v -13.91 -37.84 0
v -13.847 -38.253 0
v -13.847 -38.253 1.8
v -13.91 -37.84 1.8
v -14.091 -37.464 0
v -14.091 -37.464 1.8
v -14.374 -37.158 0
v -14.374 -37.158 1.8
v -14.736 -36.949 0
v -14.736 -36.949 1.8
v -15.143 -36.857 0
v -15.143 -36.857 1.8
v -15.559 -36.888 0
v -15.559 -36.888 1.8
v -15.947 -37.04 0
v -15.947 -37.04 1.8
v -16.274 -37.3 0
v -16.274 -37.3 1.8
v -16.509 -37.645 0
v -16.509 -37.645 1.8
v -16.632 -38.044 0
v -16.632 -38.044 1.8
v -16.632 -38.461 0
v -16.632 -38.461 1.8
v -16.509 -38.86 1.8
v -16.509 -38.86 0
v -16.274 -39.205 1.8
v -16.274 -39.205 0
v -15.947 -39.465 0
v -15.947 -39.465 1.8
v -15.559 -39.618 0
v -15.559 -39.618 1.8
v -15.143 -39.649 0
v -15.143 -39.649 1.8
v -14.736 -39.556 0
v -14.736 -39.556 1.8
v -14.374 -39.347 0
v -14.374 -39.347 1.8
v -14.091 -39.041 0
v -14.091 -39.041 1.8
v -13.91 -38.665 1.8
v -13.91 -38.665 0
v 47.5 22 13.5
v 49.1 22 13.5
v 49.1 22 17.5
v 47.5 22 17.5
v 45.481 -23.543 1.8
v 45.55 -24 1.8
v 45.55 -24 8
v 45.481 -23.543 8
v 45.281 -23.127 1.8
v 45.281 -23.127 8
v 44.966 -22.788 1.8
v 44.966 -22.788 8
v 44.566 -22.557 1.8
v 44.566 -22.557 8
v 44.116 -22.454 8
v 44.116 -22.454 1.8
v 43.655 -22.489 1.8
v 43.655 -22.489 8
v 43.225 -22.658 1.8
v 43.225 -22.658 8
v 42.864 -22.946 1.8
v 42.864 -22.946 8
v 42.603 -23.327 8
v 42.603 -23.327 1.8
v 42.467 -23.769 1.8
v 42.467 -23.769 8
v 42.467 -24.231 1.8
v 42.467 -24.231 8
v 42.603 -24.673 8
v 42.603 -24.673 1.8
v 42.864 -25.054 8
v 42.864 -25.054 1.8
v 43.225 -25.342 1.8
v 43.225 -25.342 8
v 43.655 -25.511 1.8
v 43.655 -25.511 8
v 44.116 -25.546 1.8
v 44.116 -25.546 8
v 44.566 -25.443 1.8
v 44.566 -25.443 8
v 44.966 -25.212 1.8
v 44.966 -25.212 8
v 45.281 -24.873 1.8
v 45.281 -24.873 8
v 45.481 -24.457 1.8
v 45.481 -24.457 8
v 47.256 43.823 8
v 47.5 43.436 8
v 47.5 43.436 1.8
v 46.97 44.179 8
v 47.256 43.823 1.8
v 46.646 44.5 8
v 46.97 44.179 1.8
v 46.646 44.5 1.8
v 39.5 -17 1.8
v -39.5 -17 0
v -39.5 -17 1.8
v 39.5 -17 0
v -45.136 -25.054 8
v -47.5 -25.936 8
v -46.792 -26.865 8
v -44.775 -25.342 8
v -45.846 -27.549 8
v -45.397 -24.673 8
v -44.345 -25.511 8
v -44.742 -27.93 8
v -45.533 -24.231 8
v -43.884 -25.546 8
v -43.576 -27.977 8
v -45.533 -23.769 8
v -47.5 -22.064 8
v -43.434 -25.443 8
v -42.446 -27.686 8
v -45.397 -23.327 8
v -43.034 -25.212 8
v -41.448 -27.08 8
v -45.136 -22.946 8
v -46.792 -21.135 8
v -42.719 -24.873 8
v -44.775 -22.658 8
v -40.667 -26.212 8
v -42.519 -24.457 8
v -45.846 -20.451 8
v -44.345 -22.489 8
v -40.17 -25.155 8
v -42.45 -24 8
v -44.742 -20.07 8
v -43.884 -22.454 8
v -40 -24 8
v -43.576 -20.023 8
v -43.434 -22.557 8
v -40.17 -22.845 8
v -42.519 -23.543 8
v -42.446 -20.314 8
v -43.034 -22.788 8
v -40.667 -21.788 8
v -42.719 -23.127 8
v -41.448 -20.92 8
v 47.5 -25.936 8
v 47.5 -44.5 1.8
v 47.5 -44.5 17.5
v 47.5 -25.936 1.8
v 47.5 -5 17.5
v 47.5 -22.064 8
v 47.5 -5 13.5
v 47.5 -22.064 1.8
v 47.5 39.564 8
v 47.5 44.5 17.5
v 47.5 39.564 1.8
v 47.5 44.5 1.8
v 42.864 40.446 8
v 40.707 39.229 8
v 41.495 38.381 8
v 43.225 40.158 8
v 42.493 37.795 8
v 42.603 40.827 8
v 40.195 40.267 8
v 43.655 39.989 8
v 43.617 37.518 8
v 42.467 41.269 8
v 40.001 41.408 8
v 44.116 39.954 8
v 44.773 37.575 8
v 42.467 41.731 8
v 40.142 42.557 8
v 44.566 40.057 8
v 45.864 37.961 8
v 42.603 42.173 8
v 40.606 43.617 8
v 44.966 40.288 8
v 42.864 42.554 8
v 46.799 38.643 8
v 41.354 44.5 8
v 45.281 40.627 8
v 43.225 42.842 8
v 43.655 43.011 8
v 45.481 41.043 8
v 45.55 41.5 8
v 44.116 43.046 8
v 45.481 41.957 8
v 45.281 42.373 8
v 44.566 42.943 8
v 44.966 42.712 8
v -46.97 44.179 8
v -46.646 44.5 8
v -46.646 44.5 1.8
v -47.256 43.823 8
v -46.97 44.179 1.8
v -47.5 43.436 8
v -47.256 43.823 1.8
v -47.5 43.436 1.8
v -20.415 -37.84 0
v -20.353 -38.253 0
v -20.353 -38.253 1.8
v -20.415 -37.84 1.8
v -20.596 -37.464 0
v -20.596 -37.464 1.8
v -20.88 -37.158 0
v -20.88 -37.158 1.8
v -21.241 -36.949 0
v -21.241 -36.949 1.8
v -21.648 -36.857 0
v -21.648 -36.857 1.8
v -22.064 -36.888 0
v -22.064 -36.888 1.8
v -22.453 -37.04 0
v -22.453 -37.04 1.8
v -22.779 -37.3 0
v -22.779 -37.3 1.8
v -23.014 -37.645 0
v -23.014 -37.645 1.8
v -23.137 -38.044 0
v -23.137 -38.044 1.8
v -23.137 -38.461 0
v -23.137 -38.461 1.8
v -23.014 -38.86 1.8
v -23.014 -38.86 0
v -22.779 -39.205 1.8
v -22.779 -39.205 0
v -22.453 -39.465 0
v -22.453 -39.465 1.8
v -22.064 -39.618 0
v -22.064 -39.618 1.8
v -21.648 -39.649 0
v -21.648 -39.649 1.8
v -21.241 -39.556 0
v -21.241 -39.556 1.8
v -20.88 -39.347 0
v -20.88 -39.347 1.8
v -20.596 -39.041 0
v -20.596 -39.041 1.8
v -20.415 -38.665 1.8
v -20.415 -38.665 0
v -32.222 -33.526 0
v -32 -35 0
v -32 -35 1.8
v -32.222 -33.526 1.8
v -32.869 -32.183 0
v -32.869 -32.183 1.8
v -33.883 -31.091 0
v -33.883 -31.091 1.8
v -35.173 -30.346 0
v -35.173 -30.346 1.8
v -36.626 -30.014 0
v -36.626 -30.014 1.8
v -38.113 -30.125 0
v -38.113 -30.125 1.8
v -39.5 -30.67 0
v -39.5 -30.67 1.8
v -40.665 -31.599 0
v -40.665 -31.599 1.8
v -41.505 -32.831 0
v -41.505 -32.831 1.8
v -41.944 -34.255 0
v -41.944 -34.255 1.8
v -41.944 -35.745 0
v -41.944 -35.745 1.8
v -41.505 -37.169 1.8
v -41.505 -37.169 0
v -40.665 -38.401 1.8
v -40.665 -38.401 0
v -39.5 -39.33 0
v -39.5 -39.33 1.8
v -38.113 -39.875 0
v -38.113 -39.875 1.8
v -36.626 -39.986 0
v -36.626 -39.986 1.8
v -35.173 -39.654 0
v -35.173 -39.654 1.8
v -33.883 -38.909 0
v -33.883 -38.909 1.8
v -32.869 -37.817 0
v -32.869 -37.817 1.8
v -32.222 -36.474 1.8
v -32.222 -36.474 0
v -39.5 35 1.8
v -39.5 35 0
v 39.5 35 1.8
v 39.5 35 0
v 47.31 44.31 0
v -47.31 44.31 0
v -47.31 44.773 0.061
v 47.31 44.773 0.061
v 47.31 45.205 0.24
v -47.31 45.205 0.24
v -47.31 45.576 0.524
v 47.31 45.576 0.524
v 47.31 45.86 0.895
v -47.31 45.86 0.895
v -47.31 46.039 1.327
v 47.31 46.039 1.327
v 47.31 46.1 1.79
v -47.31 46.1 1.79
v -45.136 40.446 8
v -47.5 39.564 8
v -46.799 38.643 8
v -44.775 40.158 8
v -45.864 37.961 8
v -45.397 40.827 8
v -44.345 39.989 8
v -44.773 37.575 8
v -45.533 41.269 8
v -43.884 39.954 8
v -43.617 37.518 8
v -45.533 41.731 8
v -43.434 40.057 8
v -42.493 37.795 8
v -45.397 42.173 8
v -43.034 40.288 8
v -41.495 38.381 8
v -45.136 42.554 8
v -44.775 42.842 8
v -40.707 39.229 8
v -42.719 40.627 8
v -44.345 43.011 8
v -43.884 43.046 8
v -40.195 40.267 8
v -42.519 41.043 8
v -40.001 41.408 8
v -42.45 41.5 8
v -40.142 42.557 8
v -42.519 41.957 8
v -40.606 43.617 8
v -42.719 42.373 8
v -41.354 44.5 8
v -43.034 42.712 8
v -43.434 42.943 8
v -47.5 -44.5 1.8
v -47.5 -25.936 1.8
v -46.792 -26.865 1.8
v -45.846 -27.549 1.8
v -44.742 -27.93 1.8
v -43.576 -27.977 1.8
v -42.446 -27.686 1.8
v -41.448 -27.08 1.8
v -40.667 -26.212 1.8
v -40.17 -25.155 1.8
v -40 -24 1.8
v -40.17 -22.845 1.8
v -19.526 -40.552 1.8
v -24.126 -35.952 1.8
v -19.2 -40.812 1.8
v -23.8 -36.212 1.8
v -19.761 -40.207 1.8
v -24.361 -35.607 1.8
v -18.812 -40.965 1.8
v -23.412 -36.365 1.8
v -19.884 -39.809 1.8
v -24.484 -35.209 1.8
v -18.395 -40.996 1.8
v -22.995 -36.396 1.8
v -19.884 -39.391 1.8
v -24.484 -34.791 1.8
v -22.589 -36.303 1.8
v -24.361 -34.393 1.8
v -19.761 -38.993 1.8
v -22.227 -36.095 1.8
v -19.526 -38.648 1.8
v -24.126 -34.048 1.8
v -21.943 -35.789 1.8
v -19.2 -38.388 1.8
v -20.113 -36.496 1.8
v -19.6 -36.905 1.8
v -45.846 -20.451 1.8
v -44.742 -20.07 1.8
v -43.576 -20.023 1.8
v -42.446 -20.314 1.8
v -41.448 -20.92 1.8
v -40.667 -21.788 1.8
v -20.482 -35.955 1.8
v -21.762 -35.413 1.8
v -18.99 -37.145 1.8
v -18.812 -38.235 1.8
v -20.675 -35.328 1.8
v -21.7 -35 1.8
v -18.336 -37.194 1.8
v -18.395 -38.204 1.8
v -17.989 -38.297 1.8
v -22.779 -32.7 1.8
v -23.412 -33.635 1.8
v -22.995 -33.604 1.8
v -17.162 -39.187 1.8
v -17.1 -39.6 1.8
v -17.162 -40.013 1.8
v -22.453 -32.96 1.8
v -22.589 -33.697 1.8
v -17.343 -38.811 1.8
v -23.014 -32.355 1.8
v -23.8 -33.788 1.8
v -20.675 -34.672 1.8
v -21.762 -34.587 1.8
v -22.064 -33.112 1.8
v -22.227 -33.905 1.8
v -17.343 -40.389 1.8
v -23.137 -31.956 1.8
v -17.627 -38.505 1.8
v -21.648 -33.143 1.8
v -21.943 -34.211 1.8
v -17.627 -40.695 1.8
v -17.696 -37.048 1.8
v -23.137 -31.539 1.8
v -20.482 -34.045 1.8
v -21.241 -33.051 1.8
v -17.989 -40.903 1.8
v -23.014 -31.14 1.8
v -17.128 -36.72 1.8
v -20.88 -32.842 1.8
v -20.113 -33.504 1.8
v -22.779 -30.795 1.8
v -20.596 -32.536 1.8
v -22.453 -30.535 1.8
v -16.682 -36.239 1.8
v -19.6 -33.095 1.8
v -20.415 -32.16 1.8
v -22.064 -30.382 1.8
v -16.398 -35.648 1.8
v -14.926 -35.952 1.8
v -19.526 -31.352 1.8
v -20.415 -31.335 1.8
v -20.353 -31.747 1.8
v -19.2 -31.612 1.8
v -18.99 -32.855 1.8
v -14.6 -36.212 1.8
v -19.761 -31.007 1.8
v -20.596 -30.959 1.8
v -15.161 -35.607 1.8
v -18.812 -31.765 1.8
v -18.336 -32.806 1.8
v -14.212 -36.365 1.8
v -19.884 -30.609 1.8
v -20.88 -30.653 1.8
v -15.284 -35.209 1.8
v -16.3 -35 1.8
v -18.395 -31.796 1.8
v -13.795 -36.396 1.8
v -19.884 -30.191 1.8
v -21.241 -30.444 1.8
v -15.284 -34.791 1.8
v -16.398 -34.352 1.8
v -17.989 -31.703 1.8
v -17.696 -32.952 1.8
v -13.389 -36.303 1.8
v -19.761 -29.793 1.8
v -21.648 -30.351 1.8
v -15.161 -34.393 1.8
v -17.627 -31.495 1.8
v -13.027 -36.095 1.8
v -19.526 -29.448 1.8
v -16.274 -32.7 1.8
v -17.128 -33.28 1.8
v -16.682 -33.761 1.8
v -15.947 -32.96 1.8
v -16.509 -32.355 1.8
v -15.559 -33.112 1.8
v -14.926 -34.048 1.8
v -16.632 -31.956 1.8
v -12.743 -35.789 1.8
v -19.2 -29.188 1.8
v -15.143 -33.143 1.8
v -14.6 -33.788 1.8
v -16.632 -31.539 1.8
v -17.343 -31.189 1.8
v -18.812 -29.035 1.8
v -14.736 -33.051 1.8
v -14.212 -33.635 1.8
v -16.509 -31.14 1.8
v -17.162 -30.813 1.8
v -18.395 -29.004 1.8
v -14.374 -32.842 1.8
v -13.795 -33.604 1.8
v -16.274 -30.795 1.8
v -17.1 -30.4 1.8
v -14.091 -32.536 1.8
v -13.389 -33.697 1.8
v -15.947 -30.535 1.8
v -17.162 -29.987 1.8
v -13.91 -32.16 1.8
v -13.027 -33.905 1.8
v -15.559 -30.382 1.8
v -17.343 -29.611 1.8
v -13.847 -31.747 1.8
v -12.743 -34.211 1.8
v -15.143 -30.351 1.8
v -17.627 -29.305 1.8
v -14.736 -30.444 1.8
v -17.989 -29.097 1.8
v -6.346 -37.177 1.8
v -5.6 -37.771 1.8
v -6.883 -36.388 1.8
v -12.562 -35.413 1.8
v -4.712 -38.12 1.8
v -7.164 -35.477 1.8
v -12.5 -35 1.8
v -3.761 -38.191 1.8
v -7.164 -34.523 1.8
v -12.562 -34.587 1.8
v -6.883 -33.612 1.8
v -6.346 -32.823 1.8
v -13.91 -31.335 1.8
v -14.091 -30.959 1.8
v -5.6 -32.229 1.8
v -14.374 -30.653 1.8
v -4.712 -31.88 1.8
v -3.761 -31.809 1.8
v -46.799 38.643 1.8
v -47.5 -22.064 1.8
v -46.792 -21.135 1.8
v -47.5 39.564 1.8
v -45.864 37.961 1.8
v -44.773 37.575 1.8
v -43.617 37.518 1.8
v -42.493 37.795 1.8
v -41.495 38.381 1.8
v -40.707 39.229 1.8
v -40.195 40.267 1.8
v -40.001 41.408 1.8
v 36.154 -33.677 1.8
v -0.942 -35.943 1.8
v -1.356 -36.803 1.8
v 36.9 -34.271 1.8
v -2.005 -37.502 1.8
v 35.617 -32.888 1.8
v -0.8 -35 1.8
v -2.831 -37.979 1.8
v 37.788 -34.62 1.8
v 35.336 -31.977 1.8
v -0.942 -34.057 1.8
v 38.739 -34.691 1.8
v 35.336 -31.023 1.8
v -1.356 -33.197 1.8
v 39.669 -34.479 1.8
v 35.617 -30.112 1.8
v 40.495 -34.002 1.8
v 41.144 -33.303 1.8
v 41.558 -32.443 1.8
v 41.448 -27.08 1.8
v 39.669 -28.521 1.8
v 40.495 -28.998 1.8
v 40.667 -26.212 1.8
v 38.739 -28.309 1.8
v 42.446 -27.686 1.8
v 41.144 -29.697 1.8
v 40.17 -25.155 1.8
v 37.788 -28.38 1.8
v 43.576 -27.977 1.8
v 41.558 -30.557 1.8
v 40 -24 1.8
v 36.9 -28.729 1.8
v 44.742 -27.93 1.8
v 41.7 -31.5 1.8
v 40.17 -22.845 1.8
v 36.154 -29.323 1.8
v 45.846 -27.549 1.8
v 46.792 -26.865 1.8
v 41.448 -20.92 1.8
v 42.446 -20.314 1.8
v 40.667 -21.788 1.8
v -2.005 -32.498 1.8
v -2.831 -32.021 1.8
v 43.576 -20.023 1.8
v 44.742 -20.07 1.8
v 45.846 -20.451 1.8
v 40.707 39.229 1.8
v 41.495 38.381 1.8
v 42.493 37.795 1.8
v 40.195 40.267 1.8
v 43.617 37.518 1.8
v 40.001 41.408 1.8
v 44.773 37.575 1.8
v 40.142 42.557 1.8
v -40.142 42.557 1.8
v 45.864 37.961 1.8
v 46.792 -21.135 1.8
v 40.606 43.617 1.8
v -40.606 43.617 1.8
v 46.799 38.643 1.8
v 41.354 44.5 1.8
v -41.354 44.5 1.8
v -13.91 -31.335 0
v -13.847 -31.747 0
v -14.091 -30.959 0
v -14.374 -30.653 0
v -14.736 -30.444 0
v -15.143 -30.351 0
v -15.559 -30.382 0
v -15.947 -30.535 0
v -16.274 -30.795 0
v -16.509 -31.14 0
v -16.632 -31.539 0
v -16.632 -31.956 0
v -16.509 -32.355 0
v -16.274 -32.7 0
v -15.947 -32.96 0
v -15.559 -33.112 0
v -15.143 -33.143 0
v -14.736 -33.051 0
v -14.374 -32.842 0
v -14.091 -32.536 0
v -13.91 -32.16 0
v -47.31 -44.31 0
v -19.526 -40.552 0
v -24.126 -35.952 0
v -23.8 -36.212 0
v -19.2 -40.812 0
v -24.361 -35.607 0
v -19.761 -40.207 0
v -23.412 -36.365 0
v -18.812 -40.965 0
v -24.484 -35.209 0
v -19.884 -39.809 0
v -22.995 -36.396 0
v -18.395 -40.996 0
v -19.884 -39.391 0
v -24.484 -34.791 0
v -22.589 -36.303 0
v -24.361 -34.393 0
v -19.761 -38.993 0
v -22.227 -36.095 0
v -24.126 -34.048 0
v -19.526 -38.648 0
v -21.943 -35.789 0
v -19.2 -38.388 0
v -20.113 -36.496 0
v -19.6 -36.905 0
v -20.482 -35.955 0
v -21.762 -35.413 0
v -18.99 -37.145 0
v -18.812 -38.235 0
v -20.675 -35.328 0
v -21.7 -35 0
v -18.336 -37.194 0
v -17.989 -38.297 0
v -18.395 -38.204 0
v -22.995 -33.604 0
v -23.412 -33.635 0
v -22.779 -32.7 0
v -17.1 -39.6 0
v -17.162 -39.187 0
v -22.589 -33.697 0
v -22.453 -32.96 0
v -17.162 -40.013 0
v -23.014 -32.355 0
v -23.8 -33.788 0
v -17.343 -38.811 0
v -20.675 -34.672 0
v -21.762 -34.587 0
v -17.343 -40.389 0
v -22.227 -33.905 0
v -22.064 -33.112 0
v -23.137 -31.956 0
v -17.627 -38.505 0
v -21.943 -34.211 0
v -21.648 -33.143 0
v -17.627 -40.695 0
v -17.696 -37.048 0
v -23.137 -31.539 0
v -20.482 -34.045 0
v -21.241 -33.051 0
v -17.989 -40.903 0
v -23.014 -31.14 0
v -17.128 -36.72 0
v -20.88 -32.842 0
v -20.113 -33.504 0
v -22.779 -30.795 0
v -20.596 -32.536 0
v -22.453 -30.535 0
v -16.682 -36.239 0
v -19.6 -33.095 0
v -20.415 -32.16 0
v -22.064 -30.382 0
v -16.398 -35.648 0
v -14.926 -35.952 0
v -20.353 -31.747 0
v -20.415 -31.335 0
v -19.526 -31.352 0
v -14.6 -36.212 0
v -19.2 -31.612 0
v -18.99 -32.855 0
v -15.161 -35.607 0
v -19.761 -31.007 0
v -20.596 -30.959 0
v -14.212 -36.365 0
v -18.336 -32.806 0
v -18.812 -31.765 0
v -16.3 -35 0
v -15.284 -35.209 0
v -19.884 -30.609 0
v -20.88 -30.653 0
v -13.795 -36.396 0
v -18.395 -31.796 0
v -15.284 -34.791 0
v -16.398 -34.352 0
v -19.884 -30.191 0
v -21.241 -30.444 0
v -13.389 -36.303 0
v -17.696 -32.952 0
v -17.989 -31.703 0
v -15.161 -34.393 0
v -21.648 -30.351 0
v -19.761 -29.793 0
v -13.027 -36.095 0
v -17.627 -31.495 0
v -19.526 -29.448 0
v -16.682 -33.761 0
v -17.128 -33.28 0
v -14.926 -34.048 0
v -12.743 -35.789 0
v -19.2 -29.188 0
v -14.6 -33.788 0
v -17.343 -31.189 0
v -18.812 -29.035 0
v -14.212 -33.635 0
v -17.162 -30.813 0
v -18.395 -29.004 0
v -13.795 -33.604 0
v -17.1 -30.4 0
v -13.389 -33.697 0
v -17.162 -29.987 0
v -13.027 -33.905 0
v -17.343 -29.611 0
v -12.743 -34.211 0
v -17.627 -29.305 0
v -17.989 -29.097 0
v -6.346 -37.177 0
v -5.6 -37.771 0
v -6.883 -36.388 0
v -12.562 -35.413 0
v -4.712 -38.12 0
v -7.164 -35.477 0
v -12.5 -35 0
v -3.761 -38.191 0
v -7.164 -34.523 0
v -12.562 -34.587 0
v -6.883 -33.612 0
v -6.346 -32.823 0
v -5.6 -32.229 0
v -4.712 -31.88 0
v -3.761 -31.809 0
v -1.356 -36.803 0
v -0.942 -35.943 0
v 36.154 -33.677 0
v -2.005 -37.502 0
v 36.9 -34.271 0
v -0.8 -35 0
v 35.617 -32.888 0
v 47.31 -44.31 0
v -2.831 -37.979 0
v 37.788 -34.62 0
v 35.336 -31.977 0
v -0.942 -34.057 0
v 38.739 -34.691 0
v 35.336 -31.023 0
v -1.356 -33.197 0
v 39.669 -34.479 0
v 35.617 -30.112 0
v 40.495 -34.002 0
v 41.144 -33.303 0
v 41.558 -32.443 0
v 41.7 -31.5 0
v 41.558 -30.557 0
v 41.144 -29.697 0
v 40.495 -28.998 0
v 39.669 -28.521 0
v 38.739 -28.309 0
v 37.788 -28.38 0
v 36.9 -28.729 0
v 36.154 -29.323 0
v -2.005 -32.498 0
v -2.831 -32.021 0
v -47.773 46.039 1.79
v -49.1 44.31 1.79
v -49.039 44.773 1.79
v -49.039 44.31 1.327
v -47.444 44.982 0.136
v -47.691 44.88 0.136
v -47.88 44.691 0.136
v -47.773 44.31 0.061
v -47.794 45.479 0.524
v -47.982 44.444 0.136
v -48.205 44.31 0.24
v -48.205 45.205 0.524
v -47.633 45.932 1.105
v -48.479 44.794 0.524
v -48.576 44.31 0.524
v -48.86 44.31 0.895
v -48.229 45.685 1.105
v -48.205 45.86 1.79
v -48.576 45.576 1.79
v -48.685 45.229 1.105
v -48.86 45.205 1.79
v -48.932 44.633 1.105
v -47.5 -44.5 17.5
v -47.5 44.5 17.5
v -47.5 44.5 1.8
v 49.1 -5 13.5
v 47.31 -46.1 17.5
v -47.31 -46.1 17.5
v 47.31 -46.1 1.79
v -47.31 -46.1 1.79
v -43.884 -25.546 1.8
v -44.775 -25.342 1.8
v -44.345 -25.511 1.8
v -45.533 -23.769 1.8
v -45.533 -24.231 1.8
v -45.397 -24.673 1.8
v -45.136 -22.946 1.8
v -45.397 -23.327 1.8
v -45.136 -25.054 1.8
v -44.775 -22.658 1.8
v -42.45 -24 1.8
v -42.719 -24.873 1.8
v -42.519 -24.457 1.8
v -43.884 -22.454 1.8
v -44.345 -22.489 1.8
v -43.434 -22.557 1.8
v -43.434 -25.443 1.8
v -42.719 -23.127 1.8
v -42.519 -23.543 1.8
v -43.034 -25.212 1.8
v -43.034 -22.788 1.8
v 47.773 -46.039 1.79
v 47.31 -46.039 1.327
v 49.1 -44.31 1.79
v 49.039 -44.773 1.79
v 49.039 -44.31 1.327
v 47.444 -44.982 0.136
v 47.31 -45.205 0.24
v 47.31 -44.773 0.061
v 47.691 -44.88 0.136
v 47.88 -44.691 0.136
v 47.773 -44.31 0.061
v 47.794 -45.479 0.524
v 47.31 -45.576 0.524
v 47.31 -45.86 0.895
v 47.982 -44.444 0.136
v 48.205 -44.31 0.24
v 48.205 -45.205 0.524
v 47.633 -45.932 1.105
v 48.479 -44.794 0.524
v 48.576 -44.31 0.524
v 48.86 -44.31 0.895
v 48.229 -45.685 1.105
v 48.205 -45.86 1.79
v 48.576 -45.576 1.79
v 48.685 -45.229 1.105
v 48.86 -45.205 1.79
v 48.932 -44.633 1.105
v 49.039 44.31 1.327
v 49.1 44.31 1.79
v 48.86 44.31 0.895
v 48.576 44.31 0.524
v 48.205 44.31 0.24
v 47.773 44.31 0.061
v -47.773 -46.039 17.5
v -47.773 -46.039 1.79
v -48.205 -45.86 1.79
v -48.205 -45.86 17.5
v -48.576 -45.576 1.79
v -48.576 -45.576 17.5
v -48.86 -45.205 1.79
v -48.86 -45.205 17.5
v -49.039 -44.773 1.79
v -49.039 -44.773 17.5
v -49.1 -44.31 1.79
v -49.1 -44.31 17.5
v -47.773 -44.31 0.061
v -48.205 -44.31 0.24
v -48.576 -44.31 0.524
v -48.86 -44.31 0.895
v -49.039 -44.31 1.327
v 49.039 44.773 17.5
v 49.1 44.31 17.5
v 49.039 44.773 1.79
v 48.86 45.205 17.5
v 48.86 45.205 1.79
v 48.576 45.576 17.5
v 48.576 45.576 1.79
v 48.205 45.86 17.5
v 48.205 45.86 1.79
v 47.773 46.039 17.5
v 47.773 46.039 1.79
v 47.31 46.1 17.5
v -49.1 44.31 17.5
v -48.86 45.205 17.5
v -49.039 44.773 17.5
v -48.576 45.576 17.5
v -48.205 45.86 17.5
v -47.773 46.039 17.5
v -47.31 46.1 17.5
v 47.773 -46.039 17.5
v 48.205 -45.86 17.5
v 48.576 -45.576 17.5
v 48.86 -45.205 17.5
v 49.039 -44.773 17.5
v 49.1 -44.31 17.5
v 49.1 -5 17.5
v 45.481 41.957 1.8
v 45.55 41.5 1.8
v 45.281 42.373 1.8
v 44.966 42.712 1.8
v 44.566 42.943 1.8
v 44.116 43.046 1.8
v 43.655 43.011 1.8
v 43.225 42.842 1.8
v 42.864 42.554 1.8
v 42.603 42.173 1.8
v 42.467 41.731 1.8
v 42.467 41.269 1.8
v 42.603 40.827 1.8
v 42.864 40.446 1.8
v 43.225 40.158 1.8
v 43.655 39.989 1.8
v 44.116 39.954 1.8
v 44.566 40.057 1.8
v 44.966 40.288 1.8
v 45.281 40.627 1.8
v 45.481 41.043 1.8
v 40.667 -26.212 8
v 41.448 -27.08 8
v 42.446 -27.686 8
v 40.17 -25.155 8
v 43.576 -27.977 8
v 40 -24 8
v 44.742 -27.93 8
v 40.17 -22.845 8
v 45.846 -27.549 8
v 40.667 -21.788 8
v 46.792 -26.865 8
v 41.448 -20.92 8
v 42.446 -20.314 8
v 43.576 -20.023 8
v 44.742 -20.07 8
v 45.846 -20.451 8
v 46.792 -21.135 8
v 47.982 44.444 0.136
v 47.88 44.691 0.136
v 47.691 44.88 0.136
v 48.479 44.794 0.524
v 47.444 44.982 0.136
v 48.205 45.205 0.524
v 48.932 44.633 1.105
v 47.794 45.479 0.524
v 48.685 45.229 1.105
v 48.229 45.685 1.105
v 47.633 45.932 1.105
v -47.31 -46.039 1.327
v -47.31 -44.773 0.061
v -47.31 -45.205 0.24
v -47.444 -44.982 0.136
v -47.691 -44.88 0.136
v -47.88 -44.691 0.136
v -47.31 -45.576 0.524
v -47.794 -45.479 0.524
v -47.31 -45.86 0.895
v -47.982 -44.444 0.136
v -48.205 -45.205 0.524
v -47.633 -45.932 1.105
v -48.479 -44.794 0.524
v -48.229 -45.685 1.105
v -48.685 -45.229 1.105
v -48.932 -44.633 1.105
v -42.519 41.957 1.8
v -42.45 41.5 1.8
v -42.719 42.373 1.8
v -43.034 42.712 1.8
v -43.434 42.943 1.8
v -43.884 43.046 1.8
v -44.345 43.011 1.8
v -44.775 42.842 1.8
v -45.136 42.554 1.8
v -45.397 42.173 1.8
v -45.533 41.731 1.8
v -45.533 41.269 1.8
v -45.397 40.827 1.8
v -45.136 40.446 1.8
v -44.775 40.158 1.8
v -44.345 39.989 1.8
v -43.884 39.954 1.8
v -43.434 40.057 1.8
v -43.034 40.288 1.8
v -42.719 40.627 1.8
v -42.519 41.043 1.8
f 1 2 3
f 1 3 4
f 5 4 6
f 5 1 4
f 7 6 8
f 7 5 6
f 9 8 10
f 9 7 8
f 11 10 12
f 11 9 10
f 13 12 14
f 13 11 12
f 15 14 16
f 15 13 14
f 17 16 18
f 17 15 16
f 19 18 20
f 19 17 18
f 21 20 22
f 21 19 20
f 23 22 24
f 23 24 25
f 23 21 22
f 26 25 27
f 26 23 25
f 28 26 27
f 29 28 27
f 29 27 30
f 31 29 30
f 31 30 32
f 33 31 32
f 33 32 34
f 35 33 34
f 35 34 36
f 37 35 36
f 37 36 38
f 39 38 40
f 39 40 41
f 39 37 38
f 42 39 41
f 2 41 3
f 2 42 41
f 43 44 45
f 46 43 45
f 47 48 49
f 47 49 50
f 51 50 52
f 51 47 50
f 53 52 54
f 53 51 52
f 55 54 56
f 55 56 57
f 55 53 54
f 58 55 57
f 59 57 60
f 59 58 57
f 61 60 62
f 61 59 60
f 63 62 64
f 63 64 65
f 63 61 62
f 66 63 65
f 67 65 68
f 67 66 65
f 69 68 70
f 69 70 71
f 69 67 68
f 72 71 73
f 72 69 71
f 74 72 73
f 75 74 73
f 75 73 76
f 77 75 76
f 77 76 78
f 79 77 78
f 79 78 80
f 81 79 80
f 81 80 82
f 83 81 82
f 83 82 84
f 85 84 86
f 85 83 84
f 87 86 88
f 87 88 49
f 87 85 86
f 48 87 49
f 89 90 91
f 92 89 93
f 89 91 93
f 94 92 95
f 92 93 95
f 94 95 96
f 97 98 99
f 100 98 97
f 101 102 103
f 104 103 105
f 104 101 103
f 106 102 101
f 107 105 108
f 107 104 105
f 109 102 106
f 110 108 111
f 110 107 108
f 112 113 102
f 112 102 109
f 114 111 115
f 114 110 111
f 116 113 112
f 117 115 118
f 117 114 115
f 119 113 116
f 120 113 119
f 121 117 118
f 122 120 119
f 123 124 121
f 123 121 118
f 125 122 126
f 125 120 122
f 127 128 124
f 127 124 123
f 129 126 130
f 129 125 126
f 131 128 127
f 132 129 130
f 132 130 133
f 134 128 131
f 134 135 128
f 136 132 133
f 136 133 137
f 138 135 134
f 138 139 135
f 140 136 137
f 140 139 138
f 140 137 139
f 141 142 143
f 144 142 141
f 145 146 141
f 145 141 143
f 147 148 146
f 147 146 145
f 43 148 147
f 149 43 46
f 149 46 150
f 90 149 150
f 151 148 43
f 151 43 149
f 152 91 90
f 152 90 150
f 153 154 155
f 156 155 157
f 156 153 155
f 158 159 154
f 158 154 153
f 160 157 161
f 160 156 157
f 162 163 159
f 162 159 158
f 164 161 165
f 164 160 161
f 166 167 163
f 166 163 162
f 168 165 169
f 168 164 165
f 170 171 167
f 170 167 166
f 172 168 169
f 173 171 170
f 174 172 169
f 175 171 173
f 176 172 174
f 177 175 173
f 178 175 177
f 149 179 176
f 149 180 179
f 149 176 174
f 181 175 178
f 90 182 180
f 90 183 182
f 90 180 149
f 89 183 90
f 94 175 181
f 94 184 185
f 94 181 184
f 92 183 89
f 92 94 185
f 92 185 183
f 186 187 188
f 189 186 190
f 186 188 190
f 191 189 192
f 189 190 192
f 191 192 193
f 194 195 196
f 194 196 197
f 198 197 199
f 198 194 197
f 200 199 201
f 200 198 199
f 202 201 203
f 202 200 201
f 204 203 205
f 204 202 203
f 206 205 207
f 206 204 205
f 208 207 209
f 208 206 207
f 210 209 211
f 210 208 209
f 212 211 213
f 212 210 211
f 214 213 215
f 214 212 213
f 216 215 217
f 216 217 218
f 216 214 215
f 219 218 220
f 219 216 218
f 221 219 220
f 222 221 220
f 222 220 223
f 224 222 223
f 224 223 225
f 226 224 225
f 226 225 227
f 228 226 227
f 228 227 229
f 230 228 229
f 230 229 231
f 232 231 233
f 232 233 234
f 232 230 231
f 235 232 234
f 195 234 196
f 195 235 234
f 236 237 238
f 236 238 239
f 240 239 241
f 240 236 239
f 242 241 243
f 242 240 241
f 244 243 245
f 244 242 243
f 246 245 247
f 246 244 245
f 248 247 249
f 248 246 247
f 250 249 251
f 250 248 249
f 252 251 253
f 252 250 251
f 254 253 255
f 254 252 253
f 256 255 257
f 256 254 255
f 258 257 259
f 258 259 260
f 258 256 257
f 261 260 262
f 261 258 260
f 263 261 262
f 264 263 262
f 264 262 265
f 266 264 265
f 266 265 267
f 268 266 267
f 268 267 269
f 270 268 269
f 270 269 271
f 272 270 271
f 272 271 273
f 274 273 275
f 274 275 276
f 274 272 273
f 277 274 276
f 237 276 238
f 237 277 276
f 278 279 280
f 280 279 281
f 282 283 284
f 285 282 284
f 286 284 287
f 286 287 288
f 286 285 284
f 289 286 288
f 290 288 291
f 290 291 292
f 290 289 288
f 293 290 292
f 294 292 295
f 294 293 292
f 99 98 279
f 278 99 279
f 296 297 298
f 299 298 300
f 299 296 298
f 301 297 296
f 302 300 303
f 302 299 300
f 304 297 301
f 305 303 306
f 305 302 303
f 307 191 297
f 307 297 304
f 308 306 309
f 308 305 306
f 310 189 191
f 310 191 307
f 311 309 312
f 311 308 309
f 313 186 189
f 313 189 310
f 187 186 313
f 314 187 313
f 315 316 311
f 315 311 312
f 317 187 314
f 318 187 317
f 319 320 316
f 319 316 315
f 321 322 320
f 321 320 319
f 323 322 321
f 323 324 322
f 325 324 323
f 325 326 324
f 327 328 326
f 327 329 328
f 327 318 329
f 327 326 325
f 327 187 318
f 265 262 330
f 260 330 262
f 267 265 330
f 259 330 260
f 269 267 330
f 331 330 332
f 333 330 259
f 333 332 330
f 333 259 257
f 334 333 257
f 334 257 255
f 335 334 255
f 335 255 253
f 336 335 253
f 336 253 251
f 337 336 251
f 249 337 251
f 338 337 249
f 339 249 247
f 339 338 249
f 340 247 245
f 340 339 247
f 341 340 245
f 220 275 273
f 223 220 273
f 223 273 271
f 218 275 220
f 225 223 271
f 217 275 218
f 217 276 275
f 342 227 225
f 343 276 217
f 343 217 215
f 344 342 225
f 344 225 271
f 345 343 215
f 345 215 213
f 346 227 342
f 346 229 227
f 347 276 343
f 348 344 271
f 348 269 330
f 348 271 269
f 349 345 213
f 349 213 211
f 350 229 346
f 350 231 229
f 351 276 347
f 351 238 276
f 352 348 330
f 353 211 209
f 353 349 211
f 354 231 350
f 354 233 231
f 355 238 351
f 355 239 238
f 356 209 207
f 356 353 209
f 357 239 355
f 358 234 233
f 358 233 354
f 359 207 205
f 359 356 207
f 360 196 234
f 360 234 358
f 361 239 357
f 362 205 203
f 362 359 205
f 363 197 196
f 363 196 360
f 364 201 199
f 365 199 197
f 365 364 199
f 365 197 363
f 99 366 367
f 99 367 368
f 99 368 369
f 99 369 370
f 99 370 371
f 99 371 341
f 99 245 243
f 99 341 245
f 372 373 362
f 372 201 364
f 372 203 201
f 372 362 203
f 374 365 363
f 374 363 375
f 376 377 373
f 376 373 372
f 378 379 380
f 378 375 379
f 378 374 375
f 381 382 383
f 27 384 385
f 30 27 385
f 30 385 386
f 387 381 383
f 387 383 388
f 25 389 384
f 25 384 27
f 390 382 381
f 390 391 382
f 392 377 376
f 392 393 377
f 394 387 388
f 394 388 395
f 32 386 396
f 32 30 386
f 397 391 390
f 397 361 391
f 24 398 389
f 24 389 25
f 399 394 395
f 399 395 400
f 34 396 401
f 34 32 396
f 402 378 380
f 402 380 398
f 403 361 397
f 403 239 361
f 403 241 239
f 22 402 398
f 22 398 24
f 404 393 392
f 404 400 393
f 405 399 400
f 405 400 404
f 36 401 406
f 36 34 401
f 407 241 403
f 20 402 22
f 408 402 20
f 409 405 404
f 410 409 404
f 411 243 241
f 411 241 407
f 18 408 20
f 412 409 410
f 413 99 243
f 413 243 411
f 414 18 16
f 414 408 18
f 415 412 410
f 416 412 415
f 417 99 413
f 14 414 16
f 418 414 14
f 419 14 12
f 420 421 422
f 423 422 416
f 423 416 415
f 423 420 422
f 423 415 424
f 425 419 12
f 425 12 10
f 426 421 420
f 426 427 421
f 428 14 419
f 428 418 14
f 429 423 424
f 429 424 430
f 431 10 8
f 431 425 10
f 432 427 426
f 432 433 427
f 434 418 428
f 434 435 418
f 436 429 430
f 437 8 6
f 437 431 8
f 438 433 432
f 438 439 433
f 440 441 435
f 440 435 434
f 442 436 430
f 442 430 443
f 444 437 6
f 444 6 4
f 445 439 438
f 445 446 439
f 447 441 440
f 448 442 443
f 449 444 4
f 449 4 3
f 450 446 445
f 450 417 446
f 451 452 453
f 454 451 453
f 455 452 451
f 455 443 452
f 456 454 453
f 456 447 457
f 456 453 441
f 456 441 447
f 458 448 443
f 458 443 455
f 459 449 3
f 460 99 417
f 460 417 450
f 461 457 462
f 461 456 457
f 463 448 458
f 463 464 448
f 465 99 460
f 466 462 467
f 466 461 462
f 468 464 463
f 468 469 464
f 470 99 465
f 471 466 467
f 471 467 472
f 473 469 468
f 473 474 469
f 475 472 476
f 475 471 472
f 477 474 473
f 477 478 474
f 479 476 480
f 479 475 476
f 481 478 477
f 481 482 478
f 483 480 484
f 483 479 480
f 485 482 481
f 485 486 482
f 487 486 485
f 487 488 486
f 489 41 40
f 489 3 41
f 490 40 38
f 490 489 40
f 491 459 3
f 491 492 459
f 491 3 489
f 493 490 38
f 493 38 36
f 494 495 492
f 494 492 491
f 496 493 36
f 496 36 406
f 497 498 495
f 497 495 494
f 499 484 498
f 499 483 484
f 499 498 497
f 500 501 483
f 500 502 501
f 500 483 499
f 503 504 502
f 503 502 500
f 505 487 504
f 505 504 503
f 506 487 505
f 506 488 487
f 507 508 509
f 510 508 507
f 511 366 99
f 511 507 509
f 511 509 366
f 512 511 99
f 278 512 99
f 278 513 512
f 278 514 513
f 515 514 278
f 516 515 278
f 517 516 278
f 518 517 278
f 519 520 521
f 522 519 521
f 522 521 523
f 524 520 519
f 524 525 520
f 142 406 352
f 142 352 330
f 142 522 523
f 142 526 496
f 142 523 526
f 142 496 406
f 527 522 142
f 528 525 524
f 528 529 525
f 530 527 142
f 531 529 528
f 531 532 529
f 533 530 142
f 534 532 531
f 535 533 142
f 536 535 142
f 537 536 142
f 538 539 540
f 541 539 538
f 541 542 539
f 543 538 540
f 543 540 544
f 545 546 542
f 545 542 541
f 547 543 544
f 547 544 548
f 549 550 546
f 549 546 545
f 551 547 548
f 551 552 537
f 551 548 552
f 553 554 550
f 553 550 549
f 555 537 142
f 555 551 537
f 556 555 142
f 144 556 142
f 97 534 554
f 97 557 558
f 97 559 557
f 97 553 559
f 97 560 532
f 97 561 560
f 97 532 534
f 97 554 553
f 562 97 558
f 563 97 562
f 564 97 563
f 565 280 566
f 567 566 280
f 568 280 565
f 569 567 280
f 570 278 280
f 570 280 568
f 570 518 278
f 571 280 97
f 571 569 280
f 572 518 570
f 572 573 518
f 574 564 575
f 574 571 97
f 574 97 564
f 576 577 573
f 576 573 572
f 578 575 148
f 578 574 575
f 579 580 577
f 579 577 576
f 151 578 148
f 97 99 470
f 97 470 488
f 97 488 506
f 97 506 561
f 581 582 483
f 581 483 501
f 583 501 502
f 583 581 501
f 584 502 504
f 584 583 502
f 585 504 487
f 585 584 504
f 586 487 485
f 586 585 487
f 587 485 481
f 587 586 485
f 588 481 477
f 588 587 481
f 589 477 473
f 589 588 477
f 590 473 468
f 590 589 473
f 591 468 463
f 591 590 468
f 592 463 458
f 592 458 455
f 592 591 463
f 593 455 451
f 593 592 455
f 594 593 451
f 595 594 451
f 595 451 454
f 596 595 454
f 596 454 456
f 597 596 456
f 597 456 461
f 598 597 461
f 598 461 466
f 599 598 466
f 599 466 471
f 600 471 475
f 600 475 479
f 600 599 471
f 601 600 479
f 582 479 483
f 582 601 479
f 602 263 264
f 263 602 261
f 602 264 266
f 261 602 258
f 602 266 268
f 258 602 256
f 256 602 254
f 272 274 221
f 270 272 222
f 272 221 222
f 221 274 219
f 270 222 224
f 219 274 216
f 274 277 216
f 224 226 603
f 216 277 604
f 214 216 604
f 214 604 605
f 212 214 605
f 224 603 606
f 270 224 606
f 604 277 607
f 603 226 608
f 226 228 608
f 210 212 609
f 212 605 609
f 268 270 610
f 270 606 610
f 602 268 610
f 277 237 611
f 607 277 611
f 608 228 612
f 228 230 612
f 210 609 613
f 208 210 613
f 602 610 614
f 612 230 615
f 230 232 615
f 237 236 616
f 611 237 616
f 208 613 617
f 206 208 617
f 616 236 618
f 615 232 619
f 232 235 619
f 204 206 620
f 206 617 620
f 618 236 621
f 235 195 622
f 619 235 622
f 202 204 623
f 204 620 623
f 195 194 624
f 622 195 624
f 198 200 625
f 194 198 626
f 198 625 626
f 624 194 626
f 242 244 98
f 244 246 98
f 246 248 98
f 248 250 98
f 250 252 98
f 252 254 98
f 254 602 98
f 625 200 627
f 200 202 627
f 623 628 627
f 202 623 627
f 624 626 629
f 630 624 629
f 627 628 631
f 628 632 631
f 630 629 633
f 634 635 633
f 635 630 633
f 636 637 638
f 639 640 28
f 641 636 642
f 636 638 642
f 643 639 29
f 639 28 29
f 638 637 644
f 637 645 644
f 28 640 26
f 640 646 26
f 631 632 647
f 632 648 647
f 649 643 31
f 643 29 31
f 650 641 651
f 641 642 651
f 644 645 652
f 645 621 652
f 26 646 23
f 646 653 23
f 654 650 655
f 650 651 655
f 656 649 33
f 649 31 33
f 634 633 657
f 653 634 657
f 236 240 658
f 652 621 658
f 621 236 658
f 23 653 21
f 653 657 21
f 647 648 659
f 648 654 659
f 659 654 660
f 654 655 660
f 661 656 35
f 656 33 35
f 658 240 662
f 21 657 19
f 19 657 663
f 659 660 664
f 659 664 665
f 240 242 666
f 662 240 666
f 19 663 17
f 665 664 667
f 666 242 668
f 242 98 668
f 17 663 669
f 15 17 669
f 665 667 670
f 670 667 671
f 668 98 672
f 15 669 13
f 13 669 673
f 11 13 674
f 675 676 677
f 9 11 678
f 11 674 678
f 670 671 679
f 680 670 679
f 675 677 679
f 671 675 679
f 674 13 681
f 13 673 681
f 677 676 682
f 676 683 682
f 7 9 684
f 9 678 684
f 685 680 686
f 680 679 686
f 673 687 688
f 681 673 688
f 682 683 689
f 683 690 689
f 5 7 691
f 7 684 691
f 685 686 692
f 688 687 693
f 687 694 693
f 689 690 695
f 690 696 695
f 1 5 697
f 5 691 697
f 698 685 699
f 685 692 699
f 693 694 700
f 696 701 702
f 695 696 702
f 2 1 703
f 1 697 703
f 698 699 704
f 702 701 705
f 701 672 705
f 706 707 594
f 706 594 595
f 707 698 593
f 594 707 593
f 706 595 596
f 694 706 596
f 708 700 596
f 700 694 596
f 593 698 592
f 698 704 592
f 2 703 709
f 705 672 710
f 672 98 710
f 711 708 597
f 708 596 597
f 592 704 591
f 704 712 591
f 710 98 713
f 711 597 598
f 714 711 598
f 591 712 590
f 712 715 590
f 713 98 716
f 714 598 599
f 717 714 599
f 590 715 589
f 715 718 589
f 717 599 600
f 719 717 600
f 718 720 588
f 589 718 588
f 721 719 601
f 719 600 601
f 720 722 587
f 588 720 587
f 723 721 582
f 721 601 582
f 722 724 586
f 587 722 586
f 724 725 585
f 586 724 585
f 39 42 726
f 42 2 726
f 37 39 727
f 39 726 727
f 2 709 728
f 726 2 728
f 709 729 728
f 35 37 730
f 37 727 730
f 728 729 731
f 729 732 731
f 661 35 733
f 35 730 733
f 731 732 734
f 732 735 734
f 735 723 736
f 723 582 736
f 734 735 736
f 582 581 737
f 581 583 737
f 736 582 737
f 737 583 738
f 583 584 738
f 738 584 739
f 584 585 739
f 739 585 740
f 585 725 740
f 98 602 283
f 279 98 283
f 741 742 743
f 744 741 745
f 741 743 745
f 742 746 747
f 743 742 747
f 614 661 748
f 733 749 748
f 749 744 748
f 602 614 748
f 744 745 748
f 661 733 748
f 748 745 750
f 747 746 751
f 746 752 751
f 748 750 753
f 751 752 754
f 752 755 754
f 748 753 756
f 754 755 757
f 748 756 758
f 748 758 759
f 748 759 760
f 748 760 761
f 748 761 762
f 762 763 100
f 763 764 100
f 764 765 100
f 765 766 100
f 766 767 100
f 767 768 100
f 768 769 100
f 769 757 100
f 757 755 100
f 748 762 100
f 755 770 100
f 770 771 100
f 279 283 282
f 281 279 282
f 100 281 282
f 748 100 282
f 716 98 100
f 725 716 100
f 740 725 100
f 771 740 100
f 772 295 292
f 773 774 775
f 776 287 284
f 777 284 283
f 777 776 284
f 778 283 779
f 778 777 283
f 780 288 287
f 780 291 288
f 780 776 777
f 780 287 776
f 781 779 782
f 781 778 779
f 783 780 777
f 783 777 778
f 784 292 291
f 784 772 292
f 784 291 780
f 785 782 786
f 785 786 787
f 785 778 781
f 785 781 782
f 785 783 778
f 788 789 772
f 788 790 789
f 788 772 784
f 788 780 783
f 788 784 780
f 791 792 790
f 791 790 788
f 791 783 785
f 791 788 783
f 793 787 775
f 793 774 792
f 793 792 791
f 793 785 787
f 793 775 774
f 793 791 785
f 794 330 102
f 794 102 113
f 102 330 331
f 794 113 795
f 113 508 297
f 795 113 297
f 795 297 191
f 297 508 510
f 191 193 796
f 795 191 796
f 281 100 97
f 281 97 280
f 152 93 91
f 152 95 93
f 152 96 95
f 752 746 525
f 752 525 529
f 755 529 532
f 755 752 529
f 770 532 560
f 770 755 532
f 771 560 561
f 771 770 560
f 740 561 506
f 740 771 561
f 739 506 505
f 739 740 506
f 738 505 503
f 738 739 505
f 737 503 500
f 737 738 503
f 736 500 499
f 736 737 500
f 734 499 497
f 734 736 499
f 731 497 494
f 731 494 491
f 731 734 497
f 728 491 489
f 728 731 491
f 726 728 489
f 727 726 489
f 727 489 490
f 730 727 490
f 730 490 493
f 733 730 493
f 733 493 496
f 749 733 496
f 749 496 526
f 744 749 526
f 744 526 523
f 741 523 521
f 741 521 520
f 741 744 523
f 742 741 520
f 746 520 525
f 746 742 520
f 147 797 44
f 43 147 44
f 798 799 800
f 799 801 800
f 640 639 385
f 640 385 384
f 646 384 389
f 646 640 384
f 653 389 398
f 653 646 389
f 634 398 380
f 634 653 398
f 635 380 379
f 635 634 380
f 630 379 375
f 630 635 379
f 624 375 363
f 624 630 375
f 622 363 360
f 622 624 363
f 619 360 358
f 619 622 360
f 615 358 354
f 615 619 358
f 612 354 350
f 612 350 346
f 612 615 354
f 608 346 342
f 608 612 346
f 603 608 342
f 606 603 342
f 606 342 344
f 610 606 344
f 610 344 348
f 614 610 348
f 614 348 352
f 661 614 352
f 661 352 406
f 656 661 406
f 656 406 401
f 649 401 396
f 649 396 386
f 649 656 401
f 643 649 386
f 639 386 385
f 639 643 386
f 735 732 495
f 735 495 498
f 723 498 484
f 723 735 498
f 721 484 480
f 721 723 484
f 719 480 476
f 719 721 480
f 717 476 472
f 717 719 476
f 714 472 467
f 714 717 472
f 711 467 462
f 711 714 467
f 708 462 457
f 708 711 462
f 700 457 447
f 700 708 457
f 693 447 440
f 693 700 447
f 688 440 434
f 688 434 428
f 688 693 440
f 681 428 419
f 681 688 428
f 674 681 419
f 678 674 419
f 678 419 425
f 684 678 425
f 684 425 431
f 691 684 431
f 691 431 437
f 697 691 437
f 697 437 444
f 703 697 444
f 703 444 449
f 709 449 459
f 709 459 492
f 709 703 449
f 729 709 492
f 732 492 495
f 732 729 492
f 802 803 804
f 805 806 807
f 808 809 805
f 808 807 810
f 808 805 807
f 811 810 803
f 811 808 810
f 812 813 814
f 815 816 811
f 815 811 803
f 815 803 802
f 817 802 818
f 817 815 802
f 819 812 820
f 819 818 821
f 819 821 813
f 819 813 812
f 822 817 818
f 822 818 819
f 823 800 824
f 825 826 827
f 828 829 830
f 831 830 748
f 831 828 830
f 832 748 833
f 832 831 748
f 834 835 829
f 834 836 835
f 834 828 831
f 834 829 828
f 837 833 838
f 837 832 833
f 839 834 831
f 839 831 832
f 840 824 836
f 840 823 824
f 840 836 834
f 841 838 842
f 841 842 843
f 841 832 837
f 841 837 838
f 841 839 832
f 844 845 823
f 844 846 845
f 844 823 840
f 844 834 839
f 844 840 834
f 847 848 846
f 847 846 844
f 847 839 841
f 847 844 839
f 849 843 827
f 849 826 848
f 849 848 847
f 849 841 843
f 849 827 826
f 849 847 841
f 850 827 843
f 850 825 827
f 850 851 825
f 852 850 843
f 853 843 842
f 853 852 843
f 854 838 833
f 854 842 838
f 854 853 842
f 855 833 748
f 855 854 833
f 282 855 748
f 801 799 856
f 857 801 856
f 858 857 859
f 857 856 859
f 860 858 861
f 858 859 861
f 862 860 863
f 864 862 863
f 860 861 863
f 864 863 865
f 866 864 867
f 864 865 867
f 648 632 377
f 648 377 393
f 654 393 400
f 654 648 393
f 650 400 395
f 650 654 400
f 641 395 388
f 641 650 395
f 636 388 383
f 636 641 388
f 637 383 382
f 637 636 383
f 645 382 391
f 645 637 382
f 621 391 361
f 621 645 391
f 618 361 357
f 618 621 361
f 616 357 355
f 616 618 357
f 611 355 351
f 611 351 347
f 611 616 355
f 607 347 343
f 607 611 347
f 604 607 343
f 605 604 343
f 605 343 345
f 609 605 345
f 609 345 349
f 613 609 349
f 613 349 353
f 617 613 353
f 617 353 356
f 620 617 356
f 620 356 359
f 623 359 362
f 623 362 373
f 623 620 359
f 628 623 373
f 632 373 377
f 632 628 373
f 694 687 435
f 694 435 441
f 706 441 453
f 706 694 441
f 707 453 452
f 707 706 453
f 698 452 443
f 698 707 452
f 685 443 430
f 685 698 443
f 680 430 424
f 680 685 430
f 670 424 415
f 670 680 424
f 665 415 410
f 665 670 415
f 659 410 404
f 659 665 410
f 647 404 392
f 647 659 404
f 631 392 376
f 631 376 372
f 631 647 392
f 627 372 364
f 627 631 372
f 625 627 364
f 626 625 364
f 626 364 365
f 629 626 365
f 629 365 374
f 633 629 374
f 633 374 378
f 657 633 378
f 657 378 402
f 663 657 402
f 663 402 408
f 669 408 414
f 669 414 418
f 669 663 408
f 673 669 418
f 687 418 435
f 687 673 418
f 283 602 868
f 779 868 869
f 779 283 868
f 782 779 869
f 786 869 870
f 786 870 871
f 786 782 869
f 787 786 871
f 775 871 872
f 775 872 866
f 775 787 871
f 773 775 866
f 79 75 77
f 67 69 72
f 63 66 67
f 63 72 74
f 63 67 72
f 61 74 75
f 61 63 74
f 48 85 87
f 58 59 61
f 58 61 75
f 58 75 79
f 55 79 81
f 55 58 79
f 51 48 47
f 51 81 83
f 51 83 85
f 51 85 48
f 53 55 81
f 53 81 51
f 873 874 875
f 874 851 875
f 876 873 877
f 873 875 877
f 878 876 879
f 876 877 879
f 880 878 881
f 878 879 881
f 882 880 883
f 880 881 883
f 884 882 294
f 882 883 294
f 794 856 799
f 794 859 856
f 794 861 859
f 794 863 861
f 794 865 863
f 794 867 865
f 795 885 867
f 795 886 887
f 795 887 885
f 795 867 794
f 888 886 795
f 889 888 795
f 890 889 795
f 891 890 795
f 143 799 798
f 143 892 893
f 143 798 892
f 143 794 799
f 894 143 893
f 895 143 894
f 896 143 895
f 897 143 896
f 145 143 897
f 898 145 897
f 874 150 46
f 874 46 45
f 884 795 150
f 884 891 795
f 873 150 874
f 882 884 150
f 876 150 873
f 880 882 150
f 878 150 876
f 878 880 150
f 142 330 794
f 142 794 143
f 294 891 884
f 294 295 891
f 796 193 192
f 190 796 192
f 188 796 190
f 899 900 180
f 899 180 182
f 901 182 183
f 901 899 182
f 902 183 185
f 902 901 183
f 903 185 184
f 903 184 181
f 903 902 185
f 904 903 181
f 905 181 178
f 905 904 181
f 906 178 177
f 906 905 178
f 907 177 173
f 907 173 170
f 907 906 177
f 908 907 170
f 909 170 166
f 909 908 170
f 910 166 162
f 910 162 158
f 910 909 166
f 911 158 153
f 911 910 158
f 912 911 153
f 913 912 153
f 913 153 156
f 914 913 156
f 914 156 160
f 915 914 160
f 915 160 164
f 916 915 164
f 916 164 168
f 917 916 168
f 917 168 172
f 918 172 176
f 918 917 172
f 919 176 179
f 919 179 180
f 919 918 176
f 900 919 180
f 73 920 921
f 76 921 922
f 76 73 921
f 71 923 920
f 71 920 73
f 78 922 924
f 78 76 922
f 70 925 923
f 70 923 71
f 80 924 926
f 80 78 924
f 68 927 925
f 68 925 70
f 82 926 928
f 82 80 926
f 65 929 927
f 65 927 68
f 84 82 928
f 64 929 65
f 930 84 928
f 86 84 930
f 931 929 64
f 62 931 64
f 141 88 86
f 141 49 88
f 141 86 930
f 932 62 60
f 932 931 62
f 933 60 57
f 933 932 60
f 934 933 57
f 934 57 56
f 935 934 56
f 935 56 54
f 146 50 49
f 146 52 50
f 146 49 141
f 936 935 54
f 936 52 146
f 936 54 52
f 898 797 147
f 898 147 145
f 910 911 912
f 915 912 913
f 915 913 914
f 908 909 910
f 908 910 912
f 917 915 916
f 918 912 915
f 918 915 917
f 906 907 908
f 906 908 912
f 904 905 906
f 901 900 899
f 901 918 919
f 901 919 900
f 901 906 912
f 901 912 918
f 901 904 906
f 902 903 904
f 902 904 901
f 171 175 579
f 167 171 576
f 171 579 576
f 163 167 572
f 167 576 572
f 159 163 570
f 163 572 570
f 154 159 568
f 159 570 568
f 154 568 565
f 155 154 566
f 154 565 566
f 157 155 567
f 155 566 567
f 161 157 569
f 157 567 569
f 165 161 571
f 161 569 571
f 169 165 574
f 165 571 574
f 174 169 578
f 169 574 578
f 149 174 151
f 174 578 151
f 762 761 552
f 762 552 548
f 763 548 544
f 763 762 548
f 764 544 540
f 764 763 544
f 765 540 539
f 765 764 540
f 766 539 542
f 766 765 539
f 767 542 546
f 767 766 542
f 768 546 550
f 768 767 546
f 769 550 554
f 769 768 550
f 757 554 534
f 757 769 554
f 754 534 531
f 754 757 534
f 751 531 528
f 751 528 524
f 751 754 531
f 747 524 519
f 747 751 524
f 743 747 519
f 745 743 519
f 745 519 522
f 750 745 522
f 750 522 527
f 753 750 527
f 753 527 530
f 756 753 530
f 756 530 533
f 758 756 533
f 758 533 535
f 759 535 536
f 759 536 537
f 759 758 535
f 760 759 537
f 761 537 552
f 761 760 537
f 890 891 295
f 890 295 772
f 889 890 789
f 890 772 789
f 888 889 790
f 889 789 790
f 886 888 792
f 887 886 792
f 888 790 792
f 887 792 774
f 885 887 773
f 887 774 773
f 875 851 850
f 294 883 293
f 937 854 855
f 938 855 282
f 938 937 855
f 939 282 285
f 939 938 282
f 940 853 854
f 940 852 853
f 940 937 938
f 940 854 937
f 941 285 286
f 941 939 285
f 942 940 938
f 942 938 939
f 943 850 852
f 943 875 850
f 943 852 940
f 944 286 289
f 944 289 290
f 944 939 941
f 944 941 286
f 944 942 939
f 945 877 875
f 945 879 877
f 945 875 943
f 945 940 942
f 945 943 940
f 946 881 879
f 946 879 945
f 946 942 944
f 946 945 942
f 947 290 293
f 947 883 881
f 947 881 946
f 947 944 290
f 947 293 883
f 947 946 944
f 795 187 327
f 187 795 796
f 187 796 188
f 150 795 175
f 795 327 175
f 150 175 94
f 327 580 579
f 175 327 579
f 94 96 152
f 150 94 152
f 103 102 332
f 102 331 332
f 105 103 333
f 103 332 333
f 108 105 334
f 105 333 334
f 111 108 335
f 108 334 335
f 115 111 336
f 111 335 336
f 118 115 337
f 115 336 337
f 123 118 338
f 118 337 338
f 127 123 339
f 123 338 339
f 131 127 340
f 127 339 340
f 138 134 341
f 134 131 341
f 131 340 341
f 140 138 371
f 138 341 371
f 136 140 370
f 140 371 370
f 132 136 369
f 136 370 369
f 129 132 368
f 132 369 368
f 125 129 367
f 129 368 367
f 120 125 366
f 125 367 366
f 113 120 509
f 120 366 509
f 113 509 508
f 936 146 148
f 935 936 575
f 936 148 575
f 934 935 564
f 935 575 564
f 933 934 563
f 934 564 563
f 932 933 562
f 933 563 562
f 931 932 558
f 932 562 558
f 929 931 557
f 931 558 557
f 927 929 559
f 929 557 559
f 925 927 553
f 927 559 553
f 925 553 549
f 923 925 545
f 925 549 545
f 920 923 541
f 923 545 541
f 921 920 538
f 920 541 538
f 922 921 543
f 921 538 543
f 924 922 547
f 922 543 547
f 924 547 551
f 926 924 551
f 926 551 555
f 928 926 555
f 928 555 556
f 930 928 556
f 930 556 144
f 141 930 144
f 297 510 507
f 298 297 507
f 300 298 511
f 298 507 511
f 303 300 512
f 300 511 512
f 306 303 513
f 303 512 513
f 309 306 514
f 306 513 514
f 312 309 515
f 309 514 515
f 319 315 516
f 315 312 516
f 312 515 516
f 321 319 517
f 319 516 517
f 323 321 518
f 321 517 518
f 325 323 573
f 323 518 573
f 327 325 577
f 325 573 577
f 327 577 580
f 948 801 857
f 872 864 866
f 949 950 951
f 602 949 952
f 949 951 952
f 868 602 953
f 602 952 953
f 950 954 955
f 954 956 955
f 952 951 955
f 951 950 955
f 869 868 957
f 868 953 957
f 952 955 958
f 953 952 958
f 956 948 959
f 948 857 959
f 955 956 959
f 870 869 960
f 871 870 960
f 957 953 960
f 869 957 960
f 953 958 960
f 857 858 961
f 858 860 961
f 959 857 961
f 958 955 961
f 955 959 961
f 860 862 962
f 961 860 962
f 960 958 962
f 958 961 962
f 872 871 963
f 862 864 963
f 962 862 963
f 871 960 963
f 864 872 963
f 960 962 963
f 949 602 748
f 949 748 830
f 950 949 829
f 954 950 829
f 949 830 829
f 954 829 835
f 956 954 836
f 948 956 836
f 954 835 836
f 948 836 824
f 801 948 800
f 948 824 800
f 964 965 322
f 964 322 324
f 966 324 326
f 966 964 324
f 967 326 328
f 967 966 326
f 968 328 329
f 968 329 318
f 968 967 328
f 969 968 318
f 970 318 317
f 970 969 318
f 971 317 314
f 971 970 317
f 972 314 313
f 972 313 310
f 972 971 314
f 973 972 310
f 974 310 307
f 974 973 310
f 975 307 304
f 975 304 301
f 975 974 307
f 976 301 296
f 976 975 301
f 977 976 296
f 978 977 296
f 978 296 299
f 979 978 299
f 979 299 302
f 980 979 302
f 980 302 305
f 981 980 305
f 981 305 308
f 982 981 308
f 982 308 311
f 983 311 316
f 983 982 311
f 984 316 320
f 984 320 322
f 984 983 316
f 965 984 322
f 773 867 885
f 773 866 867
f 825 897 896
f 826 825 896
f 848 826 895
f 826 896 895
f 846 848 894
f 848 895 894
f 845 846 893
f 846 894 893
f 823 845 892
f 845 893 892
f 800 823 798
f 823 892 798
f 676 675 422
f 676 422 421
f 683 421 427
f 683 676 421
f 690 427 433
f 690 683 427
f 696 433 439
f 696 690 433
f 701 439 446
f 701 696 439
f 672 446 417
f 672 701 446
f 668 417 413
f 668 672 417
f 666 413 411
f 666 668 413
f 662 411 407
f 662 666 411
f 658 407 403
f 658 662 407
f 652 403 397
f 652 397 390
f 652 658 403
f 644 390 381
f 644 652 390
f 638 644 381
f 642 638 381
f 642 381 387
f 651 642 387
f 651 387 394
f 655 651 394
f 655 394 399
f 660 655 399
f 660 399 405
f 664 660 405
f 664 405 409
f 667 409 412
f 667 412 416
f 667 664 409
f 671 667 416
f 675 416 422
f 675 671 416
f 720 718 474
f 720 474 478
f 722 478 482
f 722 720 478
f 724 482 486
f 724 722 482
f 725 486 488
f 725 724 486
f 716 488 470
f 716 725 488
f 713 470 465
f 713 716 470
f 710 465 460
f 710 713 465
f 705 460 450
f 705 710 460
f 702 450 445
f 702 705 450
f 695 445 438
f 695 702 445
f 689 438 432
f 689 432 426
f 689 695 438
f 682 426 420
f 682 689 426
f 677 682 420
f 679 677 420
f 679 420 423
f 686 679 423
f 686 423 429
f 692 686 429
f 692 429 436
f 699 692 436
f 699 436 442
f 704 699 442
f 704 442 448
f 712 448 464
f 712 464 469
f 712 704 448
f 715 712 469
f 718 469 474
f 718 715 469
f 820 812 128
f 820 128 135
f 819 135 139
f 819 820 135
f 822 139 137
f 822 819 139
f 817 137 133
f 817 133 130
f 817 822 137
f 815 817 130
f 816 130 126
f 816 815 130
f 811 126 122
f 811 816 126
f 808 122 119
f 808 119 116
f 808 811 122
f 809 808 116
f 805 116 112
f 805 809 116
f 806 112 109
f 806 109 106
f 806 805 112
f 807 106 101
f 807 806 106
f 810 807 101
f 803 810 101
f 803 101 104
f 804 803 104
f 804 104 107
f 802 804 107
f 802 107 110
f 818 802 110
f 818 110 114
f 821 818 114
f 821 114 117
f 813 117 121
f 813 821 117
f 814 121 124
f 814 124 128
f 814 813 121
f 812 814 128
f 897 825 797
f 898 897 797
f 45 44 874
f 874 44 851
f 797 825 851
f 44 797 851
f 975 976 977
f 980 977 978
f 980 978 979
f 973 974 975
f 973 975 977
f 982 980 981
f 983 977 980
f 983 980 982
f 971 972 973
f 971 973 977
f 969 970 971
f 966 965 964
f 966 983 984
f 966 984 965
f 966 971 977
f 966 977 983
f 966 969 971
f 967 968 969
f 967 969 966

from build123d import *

# Parameters (mm, degrees)
SKETCH_W      = 98.2
SKETCH_H      = 92.2
SKETCH_R      = 5
SKETCH_R_2    = 3.2
SKETCH_R_3    = 1.4
SKETCH_R_4    = 2.2
SKETCH_W_2    = 79
SKETCH_H_2    = 52
PAD_DEPTH     = 1.8
SKETCH001_W   = 98.2
SKETCH001_H   = 92.2
SKETCH001_W_2 = 95
SKETCH001_H_2 = 89
PAD001_DEPTH  = 15.7
SKETCH002_R   = 4
SKETCH002_R_2 = 1.55
PAD002_DEPTH  = 6.2
FILLET_R      = 1.79
SKETCH003_W   = 27
SKETCH003_H   = 4
POCKET_DEPTH  = 1.6


with BuildPart() as part:
    # Sketch → Pad (new body)
    with BuildSketch(Plane.XY):
        Rectangle(SKETCH_W, SKETCH_H)
        with Locations((-37, -35)):
            Circle(SKETCH_R, mode=Mode.SUBTRACT)
        with Locations((-4, -35)):
            Circle(SKETCH_R_2, mode=Mode.SUBTRACT)
        with Locations((-23.1, -35)):
            Circle(SKETCH_R_3, mode=Mode.SUBTRACT)
        with Locations((-18.5, -30.4)):
            Circle(SKETCH_R_3, mode=Mode.SUBTRACT)
        with Locations((-13.9, -35)):
            Circle(SKETCH_R_3, mode=Mode.SUBTRACT)
        with Locations((-18.5, -39.6)):
            Circle(SKETCH_R_3, mode=Mode.SUBTRACT)
        with Locations((-18.5, -35)):
            Circle(SKETCH_R_4, mode=Mode.SUBTRACT)
        with Locations((-21.752691, -31.747309)):
            Circle(SKETCH_R_3, mode=Mode.SUBTRACT)
        with Locations((-15.247309, -31.747309)):
            Circle(SKETCH_R_3, mode=Mode.SUBTRACT)
        with Locations((-15.247309, -38.252691)):
            Circle(SKETCH_R_3, mode=Mode.SUBTRACT)
        with Locations((-21.752691, -38.252691)):
            Circle(SKETCH_R_3, mode=Mode.SUBTRACT)
        with Locations((38.5, -31.5)):
            Circle(SKETCH_R_2, mode=Mode.SUBTRACT)
        with Locations((0, 9)):
            Rectangle(SKETCH_W_2, SKETCH_H_2, mode=Mode.SUBTRACT)
    extrude(amount=PAD_DEPTH)

    # Sketch001 → Pad001 (new body)
    with BuildSketch(Plane.XY.offset(1.8)):
        Rectangle(SKETCH001_W, SKETCH001_H)
        Rectangle(SKETCH001_W_2, SKETCH001_H_2, mode=Mode.SUBTRACT)
    extrude(amount=PAD001_DEPTH)

    # Sketch002 → Pad002 (new body)
    with BuildSketch(Plane.XY.offset(1.8)):
        with Locations((-44, 41.5)):
            Circle(SKETCH002_R)
        with Locations((-44, 41.5)):
            Circle(SKETCH002_R_2, mode=Mode.SUBTRACT)
        with Locations((44, 41.5)):
            Circle(SKETCH002_R)
        with Locations((44, 41.5)):
            Circle(SKETCH002_R_2, mode=Mode.SUBTRACT)
        with Locations((44, -24)):
            Circle(SKETCH002_R)
        with Locations((44, -24)):
            Circle(SKETCH002_R_2, mode=Mode.SUBTRACT)
        with Locations((-44, -24)):
            Circle(SKETCH002_R)
        with Locations((-44, -24)):
            Circle(SKETCH002_R_2, mode=Mode.SUBTRACT)
    extrude(amount=PAD002_DEPTH)

    # Fillet
    fillet_edges = [part.edges().sort_by_distance(p)[0] for p in [
        (-49.1, 46.1, 0.9),
        (-49.1, 46.1, 9.65),
        (-49.1, -46.1, 0.9),
        (-49.1, -46.1, 9.65),
        (49.1, 46.1, 0.9),
        (49.1, 46.1, 9.65),
        (49.1, -46.1, 0.9),
        (49.1, -46.1, 9.65),
        (0, -46.1, 0),
        (49.1, 0, 0),
        (0, 46.1, 0),
        (-49.1, 0, 0),
    ]]
    fillet(fillet_edges, radius=FILLET_R)

    # Sketch003 → Pocket (cut)
    with BuildSketch(Plane.YZ.offset(49.1)):
        with Locations((8.5, 15.5)):
            Rectangle(SKETCH003_W, SKETCH003_H)
    extrude(amount=-POCKET_DEPTH, mode=Mode.SUBTRACT)


solid = part.part
